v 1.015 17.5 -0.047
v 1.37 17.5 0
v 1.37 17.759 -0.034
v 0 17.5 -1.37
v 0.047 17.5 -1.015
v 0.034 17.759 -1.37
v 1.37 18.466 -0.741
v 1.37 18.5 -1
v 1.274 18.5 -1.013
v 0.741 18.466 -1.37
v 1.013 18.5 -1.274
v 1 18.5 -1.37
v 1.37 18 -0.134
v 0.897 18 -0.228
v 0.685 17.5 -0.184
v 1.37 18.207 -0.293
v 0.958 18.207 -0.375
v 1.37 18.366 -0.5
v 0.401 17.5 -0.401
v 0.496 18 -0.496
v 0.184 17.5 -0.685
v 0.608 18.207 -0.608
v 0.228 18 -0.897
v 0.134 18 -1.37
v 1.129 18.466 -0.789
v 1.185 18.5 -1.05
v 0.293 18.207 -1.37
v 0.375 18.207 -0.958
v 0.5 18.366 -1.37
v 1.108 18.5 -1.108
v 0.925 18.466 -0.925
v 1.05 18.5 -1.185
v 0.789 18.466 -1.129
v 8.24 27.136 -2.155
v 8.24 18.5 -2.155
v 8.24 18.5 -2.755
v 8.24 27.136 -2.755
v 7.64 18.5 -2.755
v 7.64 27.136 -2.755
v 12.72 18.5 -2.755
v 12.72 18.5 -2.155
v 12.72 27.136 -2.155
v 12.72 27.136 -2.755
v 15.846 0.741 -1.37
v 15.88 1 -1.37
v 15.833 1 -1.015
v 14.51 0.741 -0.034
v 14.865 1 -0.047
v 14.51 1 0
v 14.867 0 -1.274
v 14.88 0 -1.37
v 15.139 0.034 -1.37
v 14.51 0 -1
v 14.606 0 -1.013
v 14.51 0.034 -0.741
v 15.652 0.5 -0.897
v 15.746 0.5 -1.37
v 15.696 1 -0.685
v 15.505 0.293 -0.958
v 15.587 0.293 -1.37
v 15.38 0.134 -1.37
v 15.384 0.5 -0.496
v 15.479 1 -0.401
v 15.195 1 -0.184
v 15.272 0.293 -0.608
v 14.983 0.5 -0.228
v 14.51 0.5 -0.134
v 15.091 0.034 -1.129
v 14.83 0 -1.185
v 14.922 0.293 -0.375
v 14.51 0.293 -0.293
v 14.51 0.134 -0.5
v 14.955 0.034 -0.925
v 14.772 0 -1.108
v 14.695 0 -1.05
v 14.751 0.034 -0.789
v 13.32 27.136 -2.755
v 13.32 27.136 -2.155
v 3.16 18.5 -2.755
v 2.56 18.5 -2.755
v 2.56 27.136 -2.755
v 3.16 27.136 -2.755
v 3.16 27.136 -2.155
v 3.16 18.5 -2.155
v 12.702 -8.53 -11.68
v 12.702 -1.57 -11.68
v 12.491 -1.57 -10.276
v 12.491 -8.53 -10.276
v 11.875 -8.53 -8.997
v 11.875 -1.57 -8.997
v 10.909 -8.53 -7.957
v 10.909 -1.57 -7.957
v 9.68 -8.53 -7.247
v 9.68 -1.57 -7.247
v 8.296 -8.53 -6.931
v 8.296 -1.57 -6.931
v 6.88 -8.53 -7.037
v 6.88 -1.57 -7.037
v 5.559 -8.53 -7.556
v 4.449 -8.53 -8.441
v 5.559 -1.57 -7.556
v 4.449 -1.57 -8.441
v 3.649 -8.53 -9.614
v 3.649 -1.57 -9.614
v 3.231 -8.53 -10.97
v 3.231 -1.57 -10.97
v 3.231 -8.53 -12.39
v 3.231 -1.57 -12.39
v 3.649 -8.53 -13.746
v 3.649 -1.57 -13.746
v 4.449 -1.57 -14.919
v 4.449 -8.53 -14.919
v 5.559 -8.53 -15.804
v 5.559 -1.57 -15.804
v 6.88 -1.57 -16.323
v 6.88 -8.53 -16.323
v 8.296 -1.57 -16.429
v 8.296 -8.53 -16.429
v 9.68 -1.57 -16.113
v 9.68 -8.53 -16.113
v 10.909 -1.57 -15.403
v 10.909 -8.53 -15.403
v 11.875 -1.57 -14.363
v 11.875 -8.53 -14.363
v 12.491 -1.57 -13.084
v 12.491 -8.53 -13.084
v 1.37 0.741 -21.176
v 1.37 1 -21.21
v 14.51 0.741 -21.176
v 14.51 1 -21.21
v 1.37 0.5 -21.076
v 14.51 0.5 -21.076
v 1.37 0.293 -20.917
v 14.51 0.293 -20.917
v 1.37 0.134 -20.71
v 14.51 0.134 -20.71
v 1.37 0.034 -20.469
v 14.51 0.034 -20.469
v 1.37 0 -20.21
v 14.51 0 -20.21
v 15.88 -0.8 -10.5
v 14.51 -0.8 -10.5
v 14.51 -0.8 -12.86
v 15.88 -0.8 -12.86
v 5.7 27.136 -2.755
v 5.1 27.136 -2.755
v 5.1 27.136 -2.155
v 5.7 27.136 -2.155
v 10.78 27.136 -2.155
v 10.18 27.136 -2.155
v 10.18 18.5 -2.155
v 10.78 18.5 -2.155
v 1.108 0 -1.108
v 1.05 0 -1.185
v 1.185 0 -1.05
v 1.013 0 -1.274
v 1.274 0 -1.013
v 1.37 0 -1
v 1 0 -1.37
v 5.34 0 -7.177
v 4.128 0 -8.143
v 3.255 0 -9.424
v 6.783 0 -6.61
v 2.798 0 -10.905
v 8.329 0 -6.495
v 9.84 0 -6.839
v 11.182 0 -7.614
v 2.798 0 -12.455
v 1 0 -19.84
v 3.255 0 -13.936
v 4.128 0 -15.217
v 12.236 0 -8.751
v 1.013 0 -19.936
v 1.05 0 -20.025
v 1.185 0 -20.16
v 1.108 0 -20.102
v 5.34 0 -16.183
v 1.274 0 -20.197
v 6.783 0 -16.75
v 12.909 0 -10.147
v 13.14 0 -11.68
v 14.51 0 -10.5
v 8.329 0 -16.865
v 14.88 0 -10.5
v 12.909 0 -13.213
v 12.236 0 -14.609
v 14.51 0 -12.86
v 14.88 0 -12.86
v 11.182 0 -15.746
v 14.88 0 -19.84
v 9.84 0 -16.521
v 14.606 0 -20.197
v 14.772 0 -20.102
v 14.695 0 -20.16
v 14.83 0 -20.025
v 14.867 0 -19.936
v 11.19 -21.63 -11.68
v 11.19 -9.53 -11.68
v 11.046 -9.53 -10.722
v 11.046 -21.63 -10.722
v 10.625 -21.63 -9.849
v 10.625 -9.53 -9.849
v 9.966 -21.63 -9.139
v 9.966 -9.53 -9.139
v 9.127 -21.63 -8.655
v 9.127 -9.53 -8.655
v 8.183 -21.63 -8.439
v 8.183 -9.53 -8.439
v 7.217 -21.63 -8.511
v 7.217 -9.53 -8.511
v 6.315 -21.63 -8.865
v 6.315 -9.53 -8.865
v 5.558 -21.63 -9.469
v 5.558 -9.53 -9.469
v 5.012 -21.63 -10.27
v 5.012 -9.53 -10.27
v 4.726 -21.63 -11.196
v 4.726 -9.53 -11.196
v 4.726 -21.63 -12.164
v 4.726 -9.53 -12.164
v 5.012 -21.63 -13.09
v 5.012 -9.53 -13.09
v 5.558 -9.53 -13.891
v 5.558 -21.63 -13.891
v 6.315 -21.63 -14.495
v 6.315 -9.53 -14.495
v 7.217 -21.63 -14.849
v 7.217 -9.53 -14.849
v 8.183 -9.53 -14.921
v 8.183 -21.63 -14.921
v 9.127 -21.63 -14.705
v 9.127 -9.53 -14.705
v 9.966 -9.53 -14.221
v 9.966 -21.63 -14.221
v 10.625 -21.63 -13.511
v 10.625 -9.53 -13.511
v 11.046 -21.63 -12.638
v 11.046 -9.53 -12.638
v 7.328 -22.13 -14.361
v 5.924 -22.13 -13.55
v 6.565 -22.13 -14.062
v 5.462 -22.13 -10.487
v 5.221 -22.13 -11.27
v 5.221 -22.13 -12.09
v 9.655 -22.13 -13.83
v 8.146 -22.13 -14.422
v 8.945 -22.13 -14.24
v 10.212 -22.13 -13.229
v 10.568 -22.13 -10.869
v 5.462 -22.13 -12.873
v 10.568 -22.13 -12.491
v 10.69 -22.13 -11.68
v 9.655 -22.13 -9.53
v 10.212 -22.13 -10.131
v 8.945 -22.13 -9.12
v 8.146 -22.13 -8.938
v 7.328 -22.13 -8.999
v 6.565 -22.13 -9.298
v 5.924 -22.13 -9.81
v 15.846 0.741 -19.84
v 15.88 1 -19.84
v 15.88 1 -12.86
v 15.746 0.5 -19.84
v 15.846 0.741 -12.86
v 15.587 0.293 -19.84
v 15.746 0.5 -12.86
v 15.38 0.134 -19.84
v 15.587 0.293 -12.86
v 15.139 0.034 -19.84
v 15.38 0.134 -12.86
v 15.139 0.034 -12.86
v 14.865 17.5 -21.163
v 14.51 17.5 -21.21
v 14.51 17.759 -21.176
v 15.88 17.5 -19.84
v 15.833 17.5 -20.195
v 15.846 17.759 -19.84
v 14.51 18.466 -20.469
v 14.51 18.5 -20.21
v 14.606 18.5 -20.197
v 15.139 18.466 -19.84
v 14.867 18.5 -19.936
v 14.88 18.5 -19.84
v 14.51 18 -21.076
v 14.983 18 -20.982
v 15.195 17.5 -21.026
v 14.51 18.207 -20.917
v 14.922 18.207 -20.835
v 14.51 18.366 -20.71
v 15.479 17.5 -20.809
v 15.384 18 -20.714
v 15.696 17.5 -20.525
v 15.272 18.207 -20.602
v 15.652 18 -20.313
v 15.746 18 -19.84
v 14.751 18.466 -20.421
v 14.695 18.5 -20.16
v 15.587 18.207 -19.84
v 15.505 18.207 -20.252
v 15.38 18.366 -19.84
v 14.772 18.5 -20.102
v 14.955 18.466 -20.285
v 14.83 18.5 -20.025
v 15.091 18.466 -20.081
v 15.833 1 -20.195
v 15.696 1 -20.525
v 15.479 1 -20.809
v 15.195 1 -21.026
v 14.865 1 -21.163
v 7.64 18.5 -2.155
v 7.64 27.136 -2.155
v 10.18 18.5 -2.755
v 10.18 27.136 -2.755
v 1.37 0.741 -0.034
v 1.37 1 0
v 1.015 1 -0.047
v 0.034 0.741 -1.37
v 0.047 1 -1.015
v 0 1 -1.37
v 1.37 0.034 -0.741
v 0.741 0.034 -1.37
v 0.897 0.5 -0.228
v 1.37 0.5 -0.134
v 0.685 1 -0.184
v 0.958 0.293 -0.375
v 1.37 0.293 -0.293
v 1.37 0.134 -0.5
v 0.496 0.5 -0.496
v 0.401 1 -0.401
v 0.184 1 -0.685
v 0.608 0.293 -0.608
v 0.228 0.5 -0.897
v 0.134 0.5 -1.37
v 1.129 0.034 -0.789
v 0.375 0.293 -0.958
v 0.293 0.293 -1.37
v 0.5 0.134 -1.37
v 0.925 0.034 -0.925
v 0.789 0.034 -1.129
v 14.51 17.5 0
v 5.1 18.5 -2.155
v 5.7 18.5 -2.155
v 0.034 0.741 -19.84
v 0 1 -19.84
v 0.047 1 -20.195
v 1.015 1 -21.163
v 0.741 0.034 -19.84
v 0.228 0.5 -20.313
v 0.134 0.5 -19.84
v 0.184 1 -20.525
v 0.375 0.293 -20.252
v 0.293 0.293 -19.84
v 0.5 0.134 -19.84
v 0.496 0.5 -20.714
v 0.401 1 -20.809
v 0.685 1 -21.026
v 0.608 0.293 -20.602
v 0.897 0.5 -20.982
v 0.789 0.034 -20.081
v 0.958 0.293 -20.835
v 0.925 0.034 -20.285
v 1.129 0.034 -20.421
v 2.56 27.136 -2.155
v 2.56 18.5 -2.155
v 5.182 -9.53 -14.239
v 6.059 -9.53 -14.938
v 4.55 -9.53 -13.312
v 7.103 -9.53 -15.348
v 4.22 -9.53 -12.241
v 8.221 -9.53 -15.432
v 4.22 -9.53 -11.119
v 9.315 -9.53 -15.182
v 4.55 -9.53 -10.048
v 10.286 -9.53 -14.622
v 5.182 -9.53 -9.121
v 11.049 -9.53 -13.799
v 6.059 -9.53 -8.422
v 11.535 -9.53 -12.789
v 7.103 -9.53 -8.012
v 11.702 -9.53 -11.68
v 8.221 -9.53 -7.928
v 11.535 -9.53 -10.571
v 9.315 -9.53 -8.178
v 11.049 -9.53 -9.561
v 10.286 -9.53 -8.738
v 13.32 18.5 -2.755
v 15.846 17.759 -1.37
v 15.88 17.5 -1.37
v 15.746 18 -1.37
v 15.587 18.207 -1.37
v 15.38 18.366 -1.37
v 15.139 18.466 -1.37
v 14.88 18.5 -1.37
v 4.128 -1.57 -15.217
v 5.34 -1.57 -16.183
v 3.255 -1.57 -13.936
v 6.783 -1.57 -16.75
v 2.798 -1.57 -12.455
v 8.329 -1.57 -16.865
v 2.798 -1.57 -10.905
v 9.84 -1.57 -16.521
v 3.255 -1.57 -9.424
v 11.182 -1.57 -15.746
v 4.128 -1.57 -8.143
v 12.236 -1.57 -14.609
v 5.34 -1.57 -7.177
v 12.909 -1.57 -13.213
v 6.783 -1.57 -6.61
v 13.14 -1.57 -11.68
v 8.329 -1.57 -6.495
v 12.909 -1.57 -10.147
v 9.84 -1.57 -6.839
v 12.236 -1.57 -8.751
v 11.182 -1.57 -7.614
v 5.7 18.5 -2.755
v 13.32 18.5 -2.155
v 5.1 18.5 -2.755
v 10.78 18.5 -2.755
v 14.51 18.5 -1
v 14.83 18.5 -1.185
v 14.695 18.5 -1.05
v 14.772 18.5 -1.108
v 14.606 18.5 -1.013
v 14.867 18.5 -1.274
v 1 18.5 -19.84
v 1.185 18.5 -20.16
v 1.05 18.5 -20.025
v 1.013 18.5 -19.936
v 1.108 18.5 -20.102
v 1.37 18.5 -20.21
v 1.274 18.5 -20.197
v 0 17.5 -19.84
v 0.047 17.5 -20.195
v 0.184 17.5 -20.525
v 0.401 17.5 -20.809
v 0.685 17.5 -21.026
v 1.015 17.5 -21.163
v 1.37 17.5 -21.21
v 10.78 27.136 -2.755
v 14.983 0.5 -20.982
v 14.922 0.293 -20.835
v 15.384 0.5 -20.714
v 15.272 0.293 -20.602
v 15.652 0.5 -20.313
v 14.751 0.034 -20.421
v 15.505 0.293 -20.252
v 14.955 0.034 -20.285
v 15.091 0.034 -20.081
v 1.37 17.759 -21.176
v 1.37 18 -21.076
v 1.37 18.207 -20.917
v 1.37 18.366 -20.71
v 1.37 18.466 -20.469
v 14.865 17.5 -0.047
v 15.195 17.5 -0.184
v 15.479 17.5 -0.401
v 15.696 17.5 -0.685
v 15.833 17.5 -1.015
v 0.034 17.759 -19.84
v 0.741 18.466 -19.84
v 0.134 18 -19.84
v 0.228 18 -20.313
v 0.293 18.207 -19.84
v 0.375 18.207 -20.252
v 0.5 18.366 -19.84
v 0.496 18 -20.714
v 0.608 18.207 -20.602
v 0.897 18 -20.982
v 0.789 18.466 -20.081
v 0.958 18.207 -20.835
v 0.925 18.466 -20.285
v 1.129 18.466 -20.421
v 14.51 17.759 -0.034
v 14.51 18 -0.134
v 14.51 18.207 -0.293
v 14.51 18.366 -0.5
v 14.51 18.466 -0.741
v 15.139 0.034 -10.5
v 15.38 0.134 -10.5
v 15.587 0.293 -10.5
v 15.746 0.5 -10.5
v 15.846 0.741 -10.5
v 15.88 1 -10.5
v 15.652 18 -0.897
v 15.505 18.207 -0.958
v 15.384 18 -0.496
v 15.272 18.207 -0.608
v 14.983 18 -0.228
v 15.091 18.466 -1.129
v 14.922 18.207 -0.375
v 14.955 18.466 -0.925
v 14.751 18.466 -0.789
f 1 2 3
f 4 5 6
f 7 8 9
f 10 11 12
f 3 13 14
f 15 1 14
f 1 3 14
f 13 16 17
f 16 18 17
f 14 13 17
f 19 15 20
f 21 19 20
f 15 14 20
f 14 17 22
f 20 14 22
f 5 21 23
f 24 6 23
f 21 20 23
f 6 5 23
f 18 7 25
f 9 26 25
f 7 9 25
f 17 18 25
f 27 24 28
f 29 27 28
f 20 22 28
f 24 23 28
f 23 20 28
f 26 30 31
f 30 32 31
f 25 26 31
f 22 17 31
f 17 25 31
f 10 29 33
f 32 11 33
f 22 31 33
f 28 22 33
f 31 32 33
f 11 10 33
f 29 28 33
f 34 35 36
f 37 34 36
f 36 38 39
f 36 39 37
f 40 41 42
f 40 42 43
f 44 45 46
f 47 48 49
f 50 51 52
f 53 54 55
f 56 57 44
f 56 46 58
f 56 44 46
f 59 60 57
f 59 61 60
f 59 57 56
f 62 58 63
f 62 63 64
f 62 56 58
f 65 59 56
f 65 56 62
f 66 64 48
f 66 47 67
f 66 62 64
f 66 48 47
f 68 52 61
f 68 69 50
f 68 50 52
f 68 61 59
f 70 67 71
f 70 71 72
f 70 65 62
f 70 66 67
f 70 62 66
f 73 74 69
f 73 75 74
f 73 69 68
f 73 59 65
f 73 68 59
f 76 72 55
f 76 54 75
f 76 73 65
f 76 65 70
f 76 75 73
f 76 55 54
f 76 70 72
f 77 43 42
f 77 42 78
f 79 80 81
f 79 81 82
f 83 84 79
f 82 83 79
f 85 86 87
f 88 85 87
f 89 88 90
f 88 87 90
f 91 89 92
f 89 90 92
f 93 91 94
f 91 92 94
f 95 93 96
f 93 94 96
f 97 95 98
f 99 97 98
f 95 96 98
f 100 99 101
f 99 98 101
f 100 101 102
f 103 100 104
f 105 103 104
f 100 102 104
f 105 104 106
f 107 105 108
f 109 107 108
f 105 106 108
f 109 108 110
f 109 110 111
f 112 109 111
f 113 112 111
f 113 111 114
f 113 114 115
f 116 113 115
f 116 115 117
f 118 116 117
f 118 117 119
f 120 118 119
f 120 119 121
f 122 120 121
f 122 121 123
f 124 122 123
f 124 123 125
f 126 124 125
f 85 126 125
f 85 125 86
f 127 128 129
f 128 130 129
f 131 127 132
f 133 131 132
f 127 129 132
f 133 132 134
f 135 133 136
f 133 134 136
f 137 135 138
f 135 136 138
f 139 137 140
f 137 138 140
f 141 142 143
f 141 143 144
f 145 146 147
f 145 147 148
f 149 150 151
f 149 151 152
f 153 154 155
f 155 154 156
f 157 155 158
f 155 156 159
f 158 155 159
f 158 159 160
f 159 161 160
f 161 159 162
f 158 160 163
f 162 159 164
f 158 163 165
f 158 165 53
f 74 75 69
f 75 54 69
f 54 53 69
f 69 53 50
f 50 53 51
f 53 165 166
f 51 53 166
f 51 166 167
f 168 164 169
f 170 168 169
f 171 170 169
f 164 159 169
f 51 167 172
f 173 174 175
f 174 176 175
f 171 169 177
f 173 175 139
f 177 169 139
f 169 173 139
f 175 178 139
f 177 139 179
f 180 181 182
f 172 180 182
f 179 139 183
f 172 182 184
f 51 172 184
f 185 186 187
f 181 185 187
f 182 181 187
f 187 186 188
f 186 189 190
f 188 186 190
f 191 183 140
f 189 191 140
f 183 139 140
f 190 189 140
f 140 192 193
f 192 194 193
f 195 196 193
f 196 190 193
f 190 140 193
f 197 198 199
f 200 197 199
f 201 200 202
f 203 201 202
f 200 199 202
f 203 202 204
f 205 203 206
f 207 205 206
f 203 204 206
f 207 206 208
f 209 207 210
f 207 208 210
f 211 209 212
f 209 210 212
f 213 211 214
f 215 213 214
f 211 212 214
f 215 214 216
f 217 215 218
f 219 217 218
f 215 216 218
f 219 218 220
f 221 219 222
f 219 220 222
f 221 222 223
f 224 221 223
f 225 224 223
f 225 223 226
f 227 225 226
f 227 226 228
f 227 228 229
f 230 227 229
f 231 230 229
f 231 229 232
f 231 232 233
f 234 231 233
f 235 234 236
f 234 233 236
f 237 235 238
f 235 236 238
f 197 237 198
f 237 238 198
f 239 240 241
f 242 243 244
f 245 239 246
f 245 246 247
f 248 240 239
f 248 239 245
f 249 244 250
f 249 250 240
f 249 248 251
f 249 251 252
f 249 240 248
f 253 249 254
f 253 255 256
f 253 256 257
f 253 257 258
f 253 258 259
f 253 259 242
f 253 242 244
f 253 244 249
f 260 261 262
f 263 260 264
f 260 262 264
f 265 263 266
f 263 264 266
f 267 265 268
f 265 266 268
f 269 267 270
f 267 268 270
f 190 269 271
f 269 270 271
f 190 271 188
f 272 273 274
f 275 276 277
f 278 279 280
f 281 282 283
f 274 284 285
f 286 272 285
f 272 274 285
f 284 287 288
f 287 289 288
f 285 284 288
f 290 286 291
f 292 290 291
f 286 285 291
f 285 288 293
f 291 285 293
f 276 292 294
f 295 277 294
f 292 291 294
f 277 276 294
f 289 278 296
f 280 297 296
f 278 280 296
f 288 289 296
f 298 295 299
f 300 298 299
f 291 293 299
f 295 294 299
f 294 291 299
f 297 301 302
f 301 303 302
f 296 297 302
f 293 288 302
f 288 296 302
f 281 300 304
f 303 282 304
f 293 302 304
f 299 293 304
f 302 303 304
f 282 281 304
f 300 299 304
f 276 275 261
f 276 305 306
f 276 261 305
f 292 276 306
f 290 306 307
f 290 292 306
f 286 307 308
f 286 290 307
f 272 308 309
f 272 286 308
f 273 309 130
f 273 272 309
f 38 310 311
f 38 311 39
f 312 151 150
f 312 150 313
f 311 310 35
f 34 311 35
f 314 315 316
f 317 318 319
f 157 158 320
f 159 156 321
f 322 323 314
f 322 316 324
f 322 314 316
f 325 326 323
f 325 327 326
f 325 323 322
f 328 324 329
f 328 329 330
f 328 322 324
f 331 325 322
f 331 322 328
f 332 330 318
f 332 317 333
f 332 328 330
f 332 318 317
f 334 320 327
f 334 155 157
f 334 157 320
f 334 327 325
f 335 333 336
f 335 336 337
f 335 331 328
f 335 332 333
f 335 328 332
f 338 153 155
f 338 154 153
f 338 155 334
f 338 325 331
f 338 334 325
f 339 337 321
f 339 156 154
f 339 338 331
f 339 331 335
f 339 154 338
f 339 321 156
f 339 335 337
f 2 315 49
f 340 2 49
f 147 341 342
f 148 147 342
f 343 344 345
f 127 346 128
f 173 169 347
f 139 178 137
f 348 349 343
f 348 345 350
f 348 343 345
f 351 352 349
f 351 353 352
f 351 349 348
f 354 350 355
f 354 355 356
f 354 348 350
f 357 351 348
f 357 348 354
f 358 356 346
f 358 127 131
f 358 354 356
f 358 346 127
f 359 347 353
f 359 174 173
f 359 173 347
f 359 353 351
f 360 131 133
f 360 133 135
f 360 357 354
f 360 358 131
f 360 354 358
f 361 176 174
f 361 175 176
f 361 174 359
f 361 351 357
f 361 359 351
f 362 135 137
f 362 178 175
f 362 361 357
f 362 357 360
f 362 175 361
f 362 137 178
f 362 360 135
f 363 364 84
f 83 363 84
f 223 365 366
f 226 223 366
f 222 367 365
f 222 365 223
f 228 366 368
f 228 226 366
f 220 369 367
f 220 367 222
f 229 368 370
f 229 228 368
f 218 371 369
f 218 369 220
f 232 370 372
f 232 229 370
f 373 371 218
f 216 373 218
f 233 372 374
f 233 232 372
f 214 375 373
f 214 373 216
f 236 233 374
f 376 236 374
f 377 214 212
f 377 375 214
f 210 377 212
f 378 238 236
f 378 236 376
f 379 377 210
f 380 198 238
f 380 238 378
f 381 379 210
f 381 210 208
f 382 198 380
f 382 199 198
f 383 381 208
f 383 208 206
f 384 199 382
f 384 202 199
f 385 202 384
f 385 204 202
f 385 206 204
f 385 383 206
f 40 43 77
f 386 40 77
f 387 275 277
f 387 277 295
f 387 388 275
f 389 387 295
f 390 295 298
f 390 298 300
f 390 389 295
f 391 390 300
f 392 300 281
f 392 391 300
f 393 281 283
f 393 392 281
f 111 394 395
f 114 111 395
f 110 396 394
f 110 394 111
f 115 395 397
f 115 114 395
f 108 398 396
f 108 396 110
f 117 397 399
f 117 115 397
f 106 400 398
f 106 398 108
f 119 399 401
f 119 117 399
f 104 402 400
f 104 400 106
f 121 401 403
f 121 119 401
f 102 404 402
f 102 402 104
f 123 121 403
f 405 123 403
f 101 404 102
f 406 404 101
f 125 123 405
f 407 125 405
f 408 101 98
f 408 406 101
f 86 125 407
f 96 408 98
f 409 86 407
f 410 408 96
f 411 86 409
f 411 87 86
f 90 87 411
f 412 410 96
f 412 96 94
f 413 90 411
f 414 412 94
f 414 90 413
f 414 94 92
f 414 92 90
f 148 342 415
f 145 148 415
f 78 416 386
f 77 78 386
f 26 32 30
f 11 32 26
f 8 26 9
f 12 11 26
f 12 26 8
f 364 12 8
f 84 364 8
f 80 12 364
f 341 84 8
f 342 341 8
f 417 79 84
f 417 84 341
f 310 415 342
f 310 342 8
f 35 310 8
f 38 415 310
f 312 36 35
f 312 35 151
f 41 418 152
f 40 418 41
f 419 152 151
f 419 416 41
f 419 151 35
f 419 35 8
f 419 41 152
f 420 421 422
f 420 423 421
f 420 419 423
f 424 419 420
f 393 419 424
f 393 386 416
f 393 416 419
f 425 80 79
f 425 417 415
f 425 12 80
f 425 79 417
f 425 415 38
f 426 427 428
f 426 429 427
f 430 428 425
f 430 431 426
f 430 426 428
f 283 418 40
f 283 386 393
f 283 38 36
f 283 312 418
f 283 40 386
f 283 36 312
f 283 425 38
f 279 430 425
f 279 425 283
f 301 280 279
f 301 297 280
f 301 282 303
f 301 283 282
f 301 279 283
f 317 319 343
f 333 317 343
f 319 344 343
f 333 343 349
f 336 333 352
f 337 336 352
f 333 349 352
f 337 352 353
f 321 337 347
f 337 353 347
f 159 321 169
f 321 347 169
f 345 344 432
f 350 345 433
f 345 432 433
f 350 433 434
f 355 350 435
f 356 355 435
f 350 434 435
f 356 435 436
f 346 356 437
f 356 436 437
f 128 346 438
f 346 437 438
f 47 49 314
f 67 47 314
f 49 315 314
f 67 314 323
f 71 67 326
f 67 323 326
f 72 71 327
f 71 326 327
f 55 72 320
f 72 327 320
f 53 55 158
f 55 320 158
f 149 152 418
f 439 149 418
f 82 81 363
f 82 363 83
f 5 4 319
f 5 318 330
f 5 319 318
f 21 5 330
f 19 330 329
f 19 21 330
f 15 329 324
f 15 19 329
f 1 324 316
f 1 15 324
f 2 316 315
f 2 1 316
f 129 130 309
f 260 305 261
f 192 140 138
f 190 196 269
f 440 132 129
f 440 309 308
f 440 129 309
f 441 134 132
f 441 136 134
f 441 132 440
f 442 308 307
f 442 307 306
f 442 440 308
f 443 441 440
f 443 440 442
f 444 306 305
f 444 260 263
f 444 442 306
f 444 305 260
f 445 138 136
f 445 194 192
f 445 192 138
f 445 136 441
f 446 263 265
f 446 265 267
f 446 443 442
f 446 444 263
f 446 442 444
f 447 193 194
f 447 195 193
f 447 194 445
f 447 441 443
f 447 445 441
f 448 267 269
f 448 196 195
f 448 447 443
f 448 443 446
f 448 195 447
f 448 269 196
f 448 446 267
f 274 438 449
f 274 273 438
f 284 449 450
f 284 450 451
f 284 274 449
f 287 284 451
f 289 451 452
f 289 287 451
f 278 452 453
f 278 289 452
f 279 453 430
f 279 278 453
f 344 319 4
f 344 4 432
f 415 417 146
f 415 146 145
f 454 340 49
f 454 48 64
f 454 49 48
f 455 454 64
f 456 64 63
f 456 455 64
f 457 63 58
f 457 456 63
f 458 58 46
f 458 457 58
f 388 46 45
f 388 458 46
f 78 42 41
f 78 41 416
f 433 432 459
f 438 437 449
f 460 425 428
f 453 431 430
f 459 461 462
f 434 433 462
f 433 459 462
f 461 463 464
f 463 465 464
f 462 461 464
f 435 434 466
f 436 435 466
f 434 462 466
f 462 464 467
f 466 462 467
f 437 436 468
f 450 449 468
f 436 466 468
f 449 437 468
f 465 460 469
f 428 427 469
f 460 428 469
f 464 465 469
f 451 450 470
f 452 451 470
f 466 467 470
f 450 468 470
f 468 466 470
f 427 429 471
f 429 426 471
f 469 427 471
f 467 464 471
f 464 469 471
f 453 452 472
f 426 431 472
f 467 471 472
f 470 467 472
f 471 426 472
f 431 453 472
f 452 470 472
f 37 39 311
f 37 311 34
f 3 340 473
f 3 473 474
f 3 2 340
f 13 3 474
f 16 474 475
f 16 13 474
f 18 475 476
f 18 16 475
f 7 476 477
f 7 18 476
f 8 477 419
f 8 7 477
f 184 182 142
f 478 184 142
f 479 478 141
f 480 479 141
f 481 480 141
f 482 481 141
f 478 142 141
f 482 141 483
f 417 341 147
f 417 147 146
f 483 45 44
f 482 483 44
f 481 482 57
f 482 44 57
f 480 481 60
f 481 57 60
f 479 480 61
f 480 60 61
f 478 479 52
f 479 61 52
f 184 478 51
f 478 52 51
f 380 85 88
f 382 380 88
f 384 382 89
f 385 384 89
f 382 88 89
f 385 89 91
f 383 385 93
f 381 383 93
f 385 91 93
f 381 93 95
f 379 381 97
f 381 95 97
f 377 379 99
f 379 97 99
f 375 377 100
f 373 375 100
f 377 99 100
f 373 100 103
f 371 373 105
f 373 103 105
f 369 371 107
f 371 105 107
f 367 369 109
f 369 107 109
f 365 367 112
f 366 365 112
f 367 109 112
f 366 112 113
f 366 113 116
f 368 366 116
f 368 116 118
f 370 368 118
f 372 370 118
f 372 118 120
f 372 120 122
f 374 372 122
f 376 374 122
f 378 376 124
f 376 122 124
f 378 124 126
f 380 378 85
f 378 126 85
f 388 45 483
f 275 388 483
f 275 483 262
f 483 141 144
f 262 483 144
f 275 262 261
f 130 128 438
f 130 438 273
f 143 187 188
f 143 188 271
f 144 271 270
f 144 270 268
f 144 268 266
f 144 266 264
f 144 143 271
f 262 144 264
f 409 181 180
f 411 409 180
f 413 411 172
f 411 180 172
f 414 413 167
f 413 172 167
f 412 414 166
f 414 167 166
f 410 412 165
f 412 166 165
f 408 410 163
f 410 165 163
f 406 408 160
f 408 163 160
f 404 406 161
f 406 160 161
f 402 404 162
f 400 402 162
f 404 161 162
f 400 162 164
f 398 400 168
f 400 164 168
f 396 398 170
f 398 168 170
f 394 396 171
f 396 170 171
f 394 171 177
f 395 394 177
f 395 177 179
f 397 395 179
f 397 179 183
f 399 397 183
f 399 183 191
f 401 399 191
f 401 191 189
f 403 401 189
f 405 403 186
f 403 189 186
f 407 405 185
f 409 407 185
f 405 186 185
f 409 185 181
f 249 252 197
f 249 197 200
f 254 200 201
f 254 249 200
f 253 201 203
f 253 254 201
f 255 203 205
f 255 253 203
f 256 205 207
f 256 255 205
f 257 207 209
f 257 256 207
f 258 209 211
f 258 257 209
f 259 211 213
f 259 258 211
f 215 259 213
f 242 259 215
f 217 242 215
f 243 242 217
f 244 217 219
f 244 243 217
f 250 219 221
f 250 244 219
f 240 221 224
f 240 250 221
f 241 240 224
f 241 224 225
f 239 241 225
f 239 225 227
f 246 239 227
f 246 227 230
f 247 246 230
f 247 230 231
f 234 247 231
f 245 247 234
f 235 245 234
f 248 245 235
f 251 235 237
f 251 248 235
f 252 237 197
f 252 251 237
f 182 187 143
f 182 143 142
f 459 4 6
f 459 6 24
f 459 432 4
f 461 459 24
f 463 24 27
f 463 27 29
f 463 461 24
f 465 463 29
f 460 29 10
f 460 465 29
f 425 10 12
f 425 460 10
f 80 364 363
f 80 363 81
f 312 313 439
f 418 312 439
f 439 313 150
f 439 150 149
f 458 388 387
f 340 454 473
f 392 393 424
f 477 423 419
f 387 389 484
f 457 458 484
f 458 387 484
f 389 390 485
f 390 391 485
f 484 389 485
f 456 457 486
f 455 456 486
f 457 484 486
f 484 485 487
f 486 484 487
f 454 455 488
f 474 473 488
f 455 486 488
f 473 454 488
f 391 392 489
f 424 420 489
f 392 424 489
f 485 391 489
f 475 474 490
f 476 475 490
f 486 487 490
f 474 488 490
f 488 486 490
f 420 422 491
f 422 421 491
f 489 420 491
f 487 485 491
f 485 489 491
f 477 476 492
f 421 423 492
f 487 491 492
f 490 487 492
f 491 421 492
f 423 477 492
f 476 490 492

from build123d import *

# Parameters (mm, degrees)
SKETCH_2_W      = 15.88
SKETCH_2_H      = 21.21
EXTRUDE_1_DEPTH = 18.5
FILLET_1_R      = 1.37
FILLET_2_R      = 1
SKETCH_3_R      = 4.7625
EXTRUDE_2_DEPTH = 9.53
SKETCH_4_R      = 3.25
EXTRUDE_3_DEPTH = 12.6
CHAMFER_1_SIZE  = 0.5
CHAMFER_2_SIZE  = 1
SKETCH_5_R      = 5.2
EXTRUDE_4_DEPTH = 1.57
SKETCH_6_W      = 1.37
SKETCH_6_H      = 2.36
EXTRUDE_5_DEPTH = 0.8
SKETCH_6_3_W    = 1.37
SKETCH_6_3_H    = 2.36
EXTRUDE_6_DEPTH = 2
SKETCH_7_W      = 0.6
SKETCH_7_H      = 0.6
EXTRUDE_7_DEPTH = 8.636


with BuildPart() as part:
    # Эскиз2 → Бобышка-Вытянуть1 (new body)
    with BuildSketch(Plane(origin=(0, 0, 0), x_dir=(1, 0, 0), z_dir=(0, 1, 0))):
        with Locations((7.94, 10.605)):
            Rectangle(SKETCH_2_W, SKETCH_2_H)
    extrude(amount=EXTRUDE_1_DEPTH)

    # Скругление1
    fillet_1_edges = [part.edges().sort_by_distance(p)[0] for p in [
        (0, 9.25, -21.21),
        (15.88, 9.25, -21.21),
        (15.88, 9.25, 0),
        (0, 9.25, 0),
    ]]
    fillet(fillet_1_edges, radius=FILLET_1_R)

    # Скругление2
    fillet_2_edges = [part.edges().sort_by_distance(p)[0] for p in [
        (0, 0, -10.605),
        (0, 18.5, -10.605),
        (7.94, 0, -21.21),
        (15.88, 0, -10.605),
        (7.94, 0, 0),
        (0.40126371, 0, -0.40126371),
        (15.47873629, 0, -0.40126371),
        (15.47873629, 0, -20.80873629),
        (0.40126371, 0, -20.80873629),
        (7.94, 18.5, -21.21),
        (7.94, 18.5, 0),
        (15.88, 18.5, -10.605),
        (0.40126371, 18.5, -0.40126371),
        (15.47873629, 18.5, -0.40126371),
        (15.47873629, 18.5, -20.80873629),
        (0.40126371, 18.5, -20.80873629),
    ]]
    fillet(fillet_2_edges, radius=FILLET_2_R)

    # Эскиз3 → Бобышка-Вытянуть2 (add)
    with BuildSketch(Plane.XZ):
        with Locations((7.94, -11.68)):
            Circle(SKETCH_3_R)
    extrude(amount=EXTRUDE_2_DEPTH)

    # Эскиз4 → Бобышка-Вытянуть3 (add)
    with BuildSketch(Plane.XZ.offset(9.53)):
        with Locations((7.94, -11.68)):
            Circle(SKETCH_4_R)
    extrude(amount=EXTRUDE_3_DEPTH)

    # Фаска1
    chamfer_1_edges = [part.edges().sort_by_distance(p)[0] for p in [
        (4.69, -22.13, -11.68),
    ]]
    chamfer(chamfer_1_edges, length=CHAMFER_1_SIZE)

    # Фаска2
    chamfer_2_edges = [part.edges().sort_by_distance(p)[0] for p in [
        (3.1775, -9.53, -11.68),
    ]]
    chamfer(chamfer_2_edges, length=CHAMFER_2_SIZE)

    # Эскиз5 → Бобышка-Вытянуть4 (add)
    with BuildSketch(Plane.XZ):
        with Locations((7.94, -11.68)):
            Circle(SKETCH_5_R)
    extrude(amount=EXTRUDE_4_DEPTH)

    # Эскиз6 → Бобышка-Вытянуть5 (add)
    with BuildSketch(Plane.XZ):
        with Locations((15.195, -11.68)):
            Rectangle(SKETCH_6_W, SKETCH_6_H)
    extrude(amount=EXTRUDE_5_DEPTH)

    # Эскиз6<3> → Бобышка-Вытянуть6 (add)
    with BuildSketch(Plane.XZ):
        with Locations((15.195, -11.68)):
            Rectangle(SKETCH_6_3_W, SKETCH_6_3_H)
    extrude(amount=-EXTRUDE_6_DEPTH)

    # Эскиз7 → Бобышка-Вытянуть7 (add)
    with BuildSketch(Plane(origin=(0, 18.5, 0), x_dir=(1, 0, 0), z_dir=(0, 1, 0))):
        with Locations((10.48, 2.455)):
            Rectangle(SKETCH_7_W, SKETCH_7_H)
        with Locations((13.02, 2.455)):
            Rectangle(SKETCH_7_W, SKETCH_7_H)
        with Locations((5.4, 2.455)):
            Rectangle(SKETCH_7_W, SKETCH_7_H)
        with Locations((7.94, 2.455)):
            Rectangle(SKETCH_7_W, SKETCH_7_H)
        with Locations((2.86, 2.455)):
            Rectangle(SKETCH_7_W, SKETCH_7_H)
    extrude(amount=EXTRUDE_7_DEPTH)


solid = part.part
